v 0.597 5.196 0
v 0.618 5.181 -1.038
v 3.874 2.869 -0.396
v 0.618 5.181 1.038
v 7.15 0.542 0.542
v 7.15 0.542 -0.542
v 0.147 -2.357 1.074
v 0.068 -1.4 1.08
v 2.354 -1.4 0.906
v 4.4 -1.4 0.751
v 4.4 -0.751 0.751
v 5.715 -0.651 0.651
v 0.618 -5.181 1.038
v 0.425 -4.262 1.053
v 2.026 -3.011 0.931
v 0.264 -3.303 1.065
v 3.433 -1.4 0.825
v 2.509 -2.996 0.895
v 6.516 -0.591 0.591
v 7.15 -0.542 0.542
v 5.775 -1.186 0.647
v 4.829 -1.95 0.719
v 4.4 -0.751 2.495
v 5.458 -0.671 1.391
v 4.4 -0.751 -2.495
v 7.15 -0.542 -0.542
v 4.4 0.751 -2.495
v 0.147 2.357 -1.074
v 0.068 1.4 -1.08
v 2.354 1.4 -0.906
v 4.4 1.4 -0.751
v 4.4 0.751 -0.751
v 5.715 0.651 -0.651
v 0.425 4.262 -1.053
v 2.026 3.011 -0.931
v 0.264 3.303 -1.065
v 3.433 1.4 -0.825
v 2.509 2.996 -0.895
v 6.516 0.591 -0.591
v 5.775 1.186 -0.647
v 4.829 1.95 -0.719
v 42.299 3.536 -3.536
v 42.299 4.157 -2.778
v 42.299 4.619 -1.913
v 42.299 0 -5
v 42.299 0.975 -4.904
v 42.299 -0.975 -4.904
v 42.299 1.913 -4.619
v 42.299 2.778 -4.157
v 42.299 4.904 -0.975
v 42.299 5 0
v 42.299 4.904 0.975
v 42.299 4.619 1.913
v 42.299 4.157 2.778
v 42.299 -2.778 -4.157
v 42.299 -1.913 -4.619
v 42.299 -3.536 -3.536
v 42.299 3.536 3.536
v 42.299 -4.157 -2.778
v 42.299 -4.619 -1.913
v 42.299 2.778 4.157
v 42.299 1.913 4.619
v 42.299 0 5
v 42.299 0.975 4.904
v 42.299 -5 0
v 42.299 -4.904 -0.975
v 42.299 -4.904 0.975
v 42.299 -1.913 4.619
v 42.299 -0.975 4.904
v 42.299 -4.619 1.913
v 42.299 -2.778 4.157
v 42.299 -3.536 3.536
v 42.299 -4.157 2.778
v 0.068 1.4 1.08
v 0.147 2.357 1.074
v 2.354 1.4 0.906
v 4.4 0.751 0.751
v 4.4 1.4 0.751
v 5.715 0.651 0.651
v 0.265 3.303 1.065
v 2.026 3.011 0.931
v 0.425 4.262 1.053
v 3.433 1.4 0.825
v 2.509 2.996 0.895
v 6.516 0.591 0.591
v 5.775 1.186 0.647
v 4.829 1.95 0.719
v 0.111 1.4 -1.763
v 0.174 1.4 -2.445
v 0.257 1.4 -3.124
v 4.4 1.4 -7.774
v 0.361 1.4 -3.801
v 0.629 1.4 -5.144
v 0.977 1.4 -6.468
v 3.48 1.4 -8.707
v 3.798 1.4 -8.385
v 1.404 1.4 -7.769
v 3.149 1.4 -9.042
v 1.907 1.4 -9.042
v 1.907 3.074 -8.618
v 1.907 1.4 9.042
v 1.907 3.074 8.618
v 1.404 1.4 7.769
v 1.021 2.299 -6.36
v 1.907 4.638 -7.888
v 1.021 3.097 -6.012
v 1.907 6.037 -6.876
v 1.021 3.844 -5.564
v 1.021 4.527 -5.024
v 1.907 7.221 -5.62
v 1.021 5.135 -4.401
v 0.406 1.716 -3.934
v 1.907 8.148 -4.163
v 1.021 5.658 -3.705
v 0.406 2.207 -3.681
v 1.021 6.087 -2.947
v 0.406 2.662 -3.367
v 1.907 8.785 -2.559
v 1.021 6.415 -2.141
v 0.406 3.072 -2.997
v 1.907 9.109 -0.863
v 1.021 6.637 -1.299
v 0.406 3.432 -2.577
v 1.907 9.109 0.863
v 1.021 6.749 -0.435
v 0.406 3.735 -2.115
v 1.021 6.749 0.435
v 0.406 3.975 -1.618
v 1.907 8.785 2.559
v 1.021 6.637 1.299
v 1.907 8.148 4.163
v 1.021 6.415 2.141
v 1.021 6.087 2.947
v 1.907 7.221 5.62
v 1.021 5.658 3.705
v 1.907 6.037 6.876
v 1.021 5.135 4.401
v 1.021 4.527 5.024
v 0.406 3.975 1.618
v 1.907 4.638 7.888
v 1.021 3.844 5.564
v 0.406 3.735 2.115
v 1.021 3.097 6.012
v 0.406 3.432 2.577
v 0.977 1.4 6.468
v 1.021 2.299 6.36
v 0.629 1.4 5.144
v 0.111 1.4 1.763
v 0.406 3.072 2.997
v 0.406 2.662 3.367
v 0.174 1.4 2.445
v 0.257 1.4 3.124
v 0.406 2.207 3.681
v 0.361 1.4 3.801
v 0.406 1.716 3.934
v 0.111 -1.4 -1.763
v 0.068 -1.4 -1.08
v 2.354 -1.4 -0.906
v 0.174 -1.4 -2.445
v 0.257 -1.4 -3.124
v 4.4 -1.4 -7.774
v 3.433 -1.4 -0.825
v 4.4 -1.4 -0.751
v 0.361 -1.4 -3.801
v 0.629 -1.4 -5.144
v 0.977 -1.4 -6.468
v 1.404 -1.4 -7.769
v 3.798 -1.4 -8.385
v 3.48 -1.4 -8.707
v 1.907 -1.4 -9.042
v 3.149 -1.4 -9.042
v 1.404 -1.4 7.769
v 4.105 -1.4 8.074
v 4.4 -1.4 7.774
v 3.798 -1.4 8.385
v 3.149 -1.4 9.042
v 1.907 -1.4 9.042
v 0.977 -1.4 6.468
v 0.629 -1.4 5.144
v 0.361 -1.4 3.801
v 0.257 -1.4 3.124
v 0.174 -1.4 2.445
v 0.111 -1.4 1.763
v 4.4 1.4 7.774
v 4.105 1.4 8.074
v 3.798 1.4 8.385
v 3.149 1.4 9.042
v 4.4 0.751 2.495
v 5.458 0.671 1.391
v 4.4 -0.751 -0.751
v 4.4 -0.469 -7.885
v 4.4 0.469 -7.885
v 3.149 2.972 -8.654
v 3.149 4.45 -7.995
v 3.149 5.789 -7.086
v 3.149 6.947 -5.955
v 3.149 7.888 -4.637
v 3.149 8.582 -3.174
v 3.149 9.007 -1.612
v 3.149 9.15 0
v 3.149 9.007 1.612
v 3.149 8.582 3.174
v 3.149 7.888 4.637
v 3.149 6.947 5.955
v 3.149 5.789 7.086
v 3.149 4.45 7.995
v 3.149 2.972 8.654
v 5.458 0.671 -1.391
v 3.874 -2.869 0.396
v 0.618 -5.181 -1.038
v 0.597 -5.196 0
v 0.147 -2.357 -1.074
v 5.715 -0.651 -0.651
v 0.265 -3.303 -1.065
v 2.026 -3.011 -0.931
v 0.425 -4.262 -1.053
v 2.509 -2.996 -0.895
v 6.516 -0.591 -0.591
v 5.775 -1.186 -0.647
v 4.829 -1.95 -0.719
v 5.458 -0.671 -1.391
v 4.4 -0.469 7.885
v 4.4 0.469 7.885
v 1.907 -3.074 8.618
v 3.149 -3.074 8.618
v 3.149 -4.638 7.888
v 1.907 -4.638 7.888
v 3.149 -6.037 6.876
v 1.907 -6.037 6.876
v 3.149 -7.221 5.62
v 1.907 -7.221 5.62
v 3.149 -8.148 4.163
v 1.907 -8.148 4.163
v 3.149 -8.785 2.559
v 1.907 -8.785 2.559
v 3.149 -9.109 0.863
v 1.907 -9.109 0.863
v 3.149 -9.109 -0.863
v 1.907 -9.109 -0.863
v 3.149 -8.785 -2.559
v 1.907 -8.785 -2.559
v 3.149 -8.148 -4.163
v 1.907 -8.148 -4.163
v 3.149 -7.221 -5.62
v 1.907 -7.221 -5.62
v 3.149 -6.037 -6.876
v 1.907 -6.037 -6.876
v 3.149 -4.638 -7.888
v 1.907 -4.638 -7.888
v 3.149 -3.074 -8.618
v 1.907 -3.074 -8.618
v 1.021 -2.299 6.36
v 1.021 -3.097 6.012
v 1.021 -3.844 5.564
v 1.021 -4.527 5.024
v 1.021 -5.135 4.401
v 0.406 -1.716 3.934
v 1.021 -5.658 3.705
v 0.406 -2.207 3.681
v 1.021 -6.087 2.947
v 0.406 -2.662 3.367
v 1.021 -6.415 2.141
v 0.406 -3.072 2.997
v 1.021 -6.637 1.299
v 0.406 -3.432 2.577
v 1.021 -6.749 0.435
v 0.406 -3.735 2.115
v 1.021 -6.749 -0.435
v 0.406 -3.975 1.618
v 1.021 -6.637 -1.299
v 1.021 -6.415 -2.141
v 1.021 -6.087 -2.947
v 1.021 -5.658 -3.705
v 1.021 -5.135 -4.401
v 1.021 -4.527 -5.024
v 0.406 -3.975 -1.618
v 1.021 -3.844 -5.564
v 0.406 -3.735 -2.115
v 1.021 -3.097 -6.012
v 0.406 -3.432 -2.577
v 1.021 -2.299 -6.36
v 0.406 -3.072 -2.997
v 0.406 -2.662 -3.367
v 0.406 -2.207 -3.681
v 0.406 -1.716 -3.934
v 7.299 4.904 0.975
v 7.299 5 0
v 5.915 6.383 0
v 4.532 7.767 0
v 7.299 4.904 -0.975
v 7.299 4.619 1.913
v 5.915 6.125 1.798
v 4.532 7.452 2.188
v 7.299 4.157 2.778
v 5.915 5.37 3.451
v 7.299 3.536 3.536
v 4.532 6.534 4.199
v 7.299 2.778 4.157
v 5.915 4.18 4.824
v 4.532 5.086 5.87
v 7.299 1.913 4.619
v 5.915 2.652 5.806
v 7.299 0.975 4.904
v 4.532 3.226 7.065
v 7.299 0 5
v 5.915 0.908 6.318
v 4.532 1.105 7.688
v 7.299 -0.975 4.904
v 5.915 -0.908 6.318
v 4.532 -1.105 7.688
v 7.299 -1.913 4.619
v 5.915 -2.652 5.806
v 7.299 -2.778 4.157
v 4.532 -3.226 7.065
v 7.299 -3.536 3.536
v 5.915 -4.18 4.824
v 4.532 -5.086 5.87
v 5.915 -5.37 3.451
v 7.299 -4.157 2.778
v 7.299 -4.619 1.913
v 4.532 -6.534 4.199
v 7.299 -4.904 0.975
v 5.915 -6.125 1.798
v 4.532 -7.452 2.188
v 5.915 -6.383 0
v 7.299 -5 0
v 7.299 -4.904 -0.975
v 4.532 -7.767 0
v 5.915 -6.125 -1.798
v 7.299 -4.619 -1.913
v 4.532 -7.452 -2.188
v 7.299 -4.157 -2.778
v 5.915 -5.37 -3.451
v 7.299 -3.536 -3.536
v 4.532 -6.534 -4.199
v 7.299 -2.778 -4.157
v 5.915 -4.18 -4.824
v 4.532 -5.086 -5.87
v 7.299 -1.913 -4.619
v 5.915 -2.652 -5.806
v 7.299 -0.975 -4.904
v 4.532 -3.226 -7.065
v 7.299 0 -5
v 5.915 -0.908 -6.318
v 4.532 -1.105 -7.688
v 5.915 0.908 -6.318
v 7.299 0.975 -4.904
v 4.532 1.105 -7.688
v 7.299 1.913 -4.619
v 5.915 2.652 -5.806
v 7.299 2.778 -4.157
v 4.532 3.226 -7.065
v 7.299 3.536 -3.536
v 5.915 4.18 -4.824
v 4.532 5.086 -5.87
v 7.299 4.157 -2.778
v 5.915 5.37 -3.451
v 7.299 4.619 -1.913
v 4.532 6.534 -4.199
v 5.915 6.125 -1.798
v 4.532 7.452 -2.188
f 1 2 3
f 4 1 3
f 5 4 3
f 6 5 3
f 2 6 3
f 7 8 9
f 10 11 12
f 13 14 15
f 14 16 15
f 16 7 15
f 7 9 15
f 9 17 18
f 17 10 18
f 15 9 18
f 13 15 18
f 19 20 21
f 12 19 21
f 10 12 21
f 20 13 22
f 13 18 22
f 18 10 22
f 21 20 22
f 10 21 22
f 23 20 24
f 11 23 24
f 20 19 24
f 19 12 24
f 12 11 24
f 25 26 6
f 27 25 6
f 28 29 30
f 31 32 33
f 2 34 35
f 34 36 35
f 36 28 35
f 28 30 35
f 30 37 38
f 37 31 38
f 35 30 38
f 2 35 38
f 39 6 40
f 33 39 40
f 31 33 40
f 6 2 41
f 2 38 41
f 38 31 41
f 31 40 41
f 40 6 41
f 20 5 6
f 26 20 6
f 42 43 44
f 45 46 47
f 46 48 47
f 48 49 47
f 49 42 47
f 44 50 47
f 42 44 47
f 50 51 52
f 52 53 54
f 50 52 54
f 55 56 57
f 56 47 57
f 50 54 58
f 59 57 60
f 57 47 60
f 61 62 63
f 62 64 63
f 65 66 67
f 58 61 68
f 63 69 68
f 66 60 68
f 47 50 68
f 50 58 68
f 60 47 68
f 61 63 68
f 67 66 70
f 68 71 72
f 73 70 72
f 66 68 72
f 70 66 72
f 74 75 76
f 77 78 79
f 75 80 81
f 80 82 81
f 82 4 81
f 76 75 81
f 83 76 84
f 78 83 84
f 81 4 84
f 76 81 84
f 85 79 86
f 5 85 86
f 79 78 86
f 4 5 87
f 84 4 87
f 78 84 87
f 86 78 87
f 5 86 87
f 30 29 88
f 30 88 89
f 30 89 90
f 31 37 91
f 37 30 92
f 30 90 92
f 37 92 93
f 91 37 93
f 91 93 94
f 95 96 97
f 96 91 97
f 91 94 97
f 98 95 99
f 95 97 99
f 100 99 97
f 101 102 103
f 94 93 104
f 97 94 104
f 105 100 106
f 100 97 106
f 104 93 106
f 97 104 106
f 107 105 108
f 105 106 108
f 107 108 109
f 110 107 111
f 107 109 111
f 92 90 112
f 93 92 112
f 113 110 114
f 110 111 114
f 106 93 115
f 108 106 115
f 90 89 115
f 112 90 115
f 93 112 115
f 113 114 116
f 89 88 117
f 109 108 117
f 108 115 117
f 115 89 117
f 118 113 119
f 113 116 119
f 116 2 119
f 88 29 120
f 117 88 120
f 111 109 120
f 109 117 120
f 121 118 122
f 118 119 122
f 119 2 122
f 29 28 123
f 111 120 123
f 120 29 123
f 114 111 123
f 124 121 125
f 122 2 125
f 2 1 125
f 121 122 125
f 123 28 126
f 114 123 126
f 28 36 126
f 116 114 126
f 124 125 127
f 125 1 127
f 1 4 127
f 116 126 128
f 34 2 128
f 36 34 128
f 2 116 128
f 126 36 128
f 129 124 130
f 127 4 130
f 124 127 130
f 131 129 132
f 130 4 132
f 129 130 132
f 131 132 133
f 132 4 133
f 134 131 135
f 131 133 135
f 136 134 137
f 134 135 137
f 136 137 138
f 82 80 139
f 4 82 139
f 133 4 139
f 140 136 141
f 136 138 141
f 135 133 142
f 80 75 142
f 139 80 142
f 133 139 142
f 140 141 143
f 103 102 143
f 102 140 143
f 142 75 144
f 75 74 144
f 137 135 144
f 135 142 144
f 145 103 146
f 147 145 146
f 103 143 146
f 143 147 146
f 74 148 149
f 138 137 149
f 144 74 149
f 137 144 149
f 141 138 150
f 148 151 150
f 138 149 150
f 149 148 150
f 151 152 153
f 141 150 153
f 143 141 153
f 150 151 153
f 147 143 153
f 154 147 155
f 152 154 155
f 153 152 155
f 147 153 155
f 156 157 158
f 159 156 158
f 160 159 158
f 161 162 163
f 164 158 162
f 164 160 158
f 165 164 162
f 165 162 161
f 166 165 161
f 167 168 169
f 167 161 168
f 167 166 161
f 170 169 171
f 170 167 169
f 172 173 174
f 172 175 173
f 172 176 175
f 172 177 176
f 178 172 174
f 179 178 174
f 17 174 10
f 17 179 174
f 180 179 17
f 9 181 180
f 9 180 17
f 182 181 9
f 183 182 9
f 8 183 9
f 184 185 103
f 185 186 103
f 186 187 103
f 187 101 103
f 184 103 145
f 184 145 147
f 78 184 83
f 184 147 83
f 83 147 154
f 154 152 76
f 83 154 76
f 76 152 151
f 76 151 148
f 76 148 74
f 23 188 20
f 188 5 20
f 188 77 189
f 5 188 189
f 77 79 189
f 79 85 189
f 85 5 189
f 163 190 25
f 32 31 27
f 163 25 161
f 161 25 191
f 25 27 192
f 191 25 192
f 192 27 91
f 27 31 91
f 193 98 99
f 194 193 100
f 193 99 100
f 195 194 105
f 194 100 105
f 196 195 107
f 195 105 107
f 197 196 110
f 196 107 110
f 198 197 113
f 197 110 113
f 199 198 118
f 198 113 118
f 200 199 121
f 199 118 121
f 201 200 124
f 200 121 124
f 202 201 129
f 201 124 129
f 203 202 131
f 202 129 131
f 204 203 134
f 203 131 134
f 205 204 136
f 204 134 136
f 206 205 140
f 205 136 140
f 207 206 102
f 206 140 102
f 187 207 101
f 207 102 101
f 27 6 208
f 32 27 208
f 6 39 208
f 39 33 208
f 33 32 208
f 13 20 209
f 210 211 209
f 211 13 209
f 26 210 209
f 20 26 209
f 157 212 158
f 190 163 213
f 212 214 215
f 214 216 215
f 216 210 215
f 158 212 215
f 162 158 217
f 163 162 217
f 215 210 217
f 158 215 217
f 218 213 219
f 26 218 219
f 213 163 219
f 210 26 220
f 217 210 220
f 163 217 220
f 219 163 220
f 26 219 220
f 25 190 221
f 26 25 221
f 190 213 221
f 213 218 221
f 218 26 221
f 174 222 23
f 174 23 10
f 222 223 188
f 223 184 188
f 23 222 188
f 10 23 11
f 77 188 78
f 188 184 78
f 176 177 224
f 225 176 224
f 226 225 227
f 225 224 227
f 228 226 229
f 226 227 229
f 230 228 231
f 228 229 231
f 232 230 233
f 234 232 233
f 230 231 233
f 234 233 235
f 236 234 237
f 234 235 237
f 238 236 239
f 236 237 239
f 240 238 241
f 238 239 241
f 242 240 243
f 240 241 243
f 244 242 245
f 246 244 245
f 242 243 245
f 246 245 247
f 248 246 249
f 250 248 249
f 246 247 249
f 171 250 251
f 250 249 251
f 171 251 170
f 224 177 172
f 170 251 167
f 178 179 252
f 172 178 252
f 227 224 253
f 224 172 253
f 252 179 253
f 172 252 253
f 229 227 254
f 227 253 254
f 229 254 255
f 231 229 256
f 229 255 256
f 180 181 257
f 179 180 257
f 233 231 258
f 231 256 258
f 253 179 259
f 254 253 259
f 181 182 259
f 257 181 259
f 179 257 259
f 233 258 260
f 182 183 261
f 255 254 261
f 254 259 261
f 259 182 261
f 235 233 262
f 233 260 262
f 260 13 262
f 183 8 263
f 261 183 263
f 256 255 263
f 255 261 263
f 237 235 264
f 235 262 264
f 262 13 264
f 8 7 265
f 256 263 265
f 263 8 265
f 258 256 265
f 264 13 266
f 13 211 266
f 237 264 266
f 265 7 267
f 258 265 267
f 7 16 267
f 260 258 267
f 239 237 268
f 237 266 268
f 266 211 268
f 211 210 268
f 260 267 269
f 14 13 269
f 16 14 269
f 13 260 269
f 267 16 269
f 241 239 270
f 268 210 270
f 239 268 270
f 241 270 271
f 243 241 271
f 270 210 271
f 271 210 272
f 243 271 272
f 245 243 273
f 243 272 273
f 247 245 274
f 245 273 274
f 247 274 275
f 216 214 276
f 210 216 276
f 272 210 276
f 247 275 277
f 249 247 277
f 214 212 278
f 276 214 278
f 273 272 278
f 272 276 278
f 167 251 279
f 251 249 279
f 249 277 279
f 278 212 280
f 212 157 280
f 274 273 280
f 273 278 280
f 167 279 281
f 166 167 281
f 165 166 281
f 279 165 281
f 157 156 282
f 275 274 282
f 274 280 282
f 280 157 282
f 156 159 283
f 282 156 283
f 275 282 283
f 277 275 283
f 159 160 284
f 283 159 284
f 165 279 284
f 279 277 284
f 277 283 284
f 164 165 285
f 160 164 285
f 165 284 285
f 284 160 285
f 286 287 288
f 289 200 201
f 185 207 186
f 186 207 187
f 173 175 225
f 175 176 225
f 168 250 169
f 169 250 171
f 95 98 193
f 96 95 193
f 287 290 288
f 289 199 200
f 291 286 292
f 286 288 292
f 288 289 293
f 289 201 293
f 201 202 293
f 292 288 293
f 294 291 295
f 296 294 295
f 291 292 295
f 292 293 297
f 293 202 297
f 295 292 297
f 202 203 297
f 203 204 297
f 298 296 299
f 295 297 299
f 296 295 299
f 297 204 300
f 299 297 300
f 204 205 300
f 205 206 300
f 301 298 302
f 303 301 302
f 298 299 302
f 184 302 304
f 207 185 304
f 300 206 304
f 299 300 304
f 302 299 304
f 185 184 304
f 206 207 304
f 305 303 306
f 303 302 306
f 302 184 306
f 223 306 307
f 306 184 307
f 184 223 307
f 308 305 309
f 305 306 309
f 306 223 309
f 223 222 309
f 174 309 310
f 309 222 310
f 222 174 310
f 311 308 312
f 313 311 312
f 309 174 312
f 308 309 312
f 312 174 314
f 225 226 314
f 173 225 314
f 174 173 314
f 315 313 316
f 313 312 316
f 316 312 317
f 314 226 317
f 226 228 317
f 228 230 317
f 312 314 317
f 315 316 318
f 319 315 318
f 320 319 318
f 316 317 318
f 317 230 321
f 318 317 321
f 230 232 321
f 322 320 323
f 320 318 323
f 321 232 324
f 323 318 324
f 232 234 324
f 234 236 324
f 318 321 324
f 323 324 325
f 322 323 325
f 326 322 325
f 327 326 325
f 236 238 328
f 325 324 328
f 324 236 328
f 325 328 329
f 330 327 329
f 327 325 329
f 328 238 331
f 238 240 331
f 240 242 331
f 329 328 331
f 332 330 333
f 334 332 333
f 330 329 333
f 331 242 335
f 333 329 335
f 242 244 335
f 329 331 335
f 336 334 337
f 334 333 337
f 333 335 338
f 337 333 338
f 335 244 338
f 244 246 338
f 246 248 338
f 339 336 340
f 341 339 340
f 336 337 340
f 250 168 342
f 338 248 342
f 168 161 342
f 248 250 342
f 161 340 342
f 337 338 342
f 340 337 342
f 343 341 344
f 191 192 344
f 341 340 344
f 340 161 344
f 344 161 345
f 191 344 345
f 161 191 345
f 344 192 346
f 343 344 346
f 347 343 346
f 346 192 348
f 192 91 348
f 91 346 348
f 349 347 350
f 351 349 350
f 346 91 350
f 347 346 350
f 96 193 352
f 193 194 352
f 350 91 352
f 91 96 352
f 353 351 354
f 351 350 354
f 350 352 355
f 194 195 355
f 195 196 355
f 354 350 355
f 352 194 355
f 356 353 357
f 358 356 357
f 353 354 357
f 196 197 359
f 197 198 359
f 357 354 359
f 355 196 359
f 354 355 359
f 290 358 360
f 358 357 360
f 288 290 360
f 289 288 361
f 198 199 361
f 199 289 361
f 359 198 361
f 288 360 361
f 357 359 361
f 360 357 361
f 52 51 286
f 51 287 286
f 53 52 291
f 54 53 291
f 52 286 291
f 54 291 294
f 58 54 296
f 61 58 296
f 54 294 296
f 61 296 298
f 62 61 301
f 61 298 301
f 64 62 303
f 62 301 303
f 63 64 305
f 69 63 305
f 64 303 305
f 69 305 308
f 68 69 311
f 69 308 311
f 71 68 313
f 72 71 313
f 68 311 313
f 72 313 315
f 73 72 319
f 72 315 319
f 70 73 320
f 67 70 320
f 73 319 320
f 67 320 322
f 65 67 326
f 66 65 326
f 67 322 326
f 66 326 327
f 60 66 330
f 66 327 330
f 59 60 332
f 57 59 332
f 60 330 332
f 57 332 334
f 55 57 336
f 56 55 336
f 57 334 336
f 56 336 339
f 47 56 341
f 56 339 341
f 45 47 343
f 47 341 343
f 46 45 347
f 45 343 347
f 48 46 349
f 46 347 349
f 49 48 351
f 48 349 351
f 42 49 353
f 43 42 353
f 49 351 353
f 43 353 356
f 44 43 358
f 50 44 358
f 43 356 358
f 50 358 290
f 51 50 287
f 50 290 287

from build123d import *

# Parameters (mm, degrees)
SKETCH2_W         = 18.3
SKETCH2_H         = 2.8
SLOT_DEPTH        = 4.4
SKETCH3_W         = 2.17
SKETCH3_H         = 11.24
SKETCH4_W         = 1.085
SKETCH4_H         = 1.085
CIRPATTERN1_COUNT = 2
CIRPATTERN1_ANGLE = 90


with BuildPart() as part:
    # BodySke → Base-Revolve (revolve)
    with BuildSketch(Plane.XY):
        with BuildLine():
            Line((0, 0), (42.298786444, 0))
            Line((42.298786444, 0), (42.298786444, 5))
            Line((42.298786444, 5), (7.298786444, 5))
            Line((7.298786444, 5), (3.148786444, 9.15))
            Line((3.148786444, 9.15), (1.907441795, 9.15))
            ThreePointArc((1.907441795, 9.15), (0.481931585, 4.673350891), (0, 0))
        make_face()
    revolve(axis=Axis((-15.875, 0, 0), (1, 0, 0)))

    # Sketch2 → Slot (cut)
    with BuildSketch(Plane(origin=(0, 0, 0), x_dir=(0, 0, -1), z_dir=(1, 0, 0))):
        Rectangle(SKETCH2_W, SKETCH2_H)
    extrude(amount=SLOT_DEPTH, mode=Mode.SUBTRACT)

    # Sketch3 → Cross section 0
    with BuildSketch(Plane(origin=(0, 0, 0), x_dir=(0, 0, -1), z_dir=(1, 0, 0))):
        Rectangle(SKETCH3_W, SKETCH3_H)
    # Sketch4 → Cross section 1
    with BuildSketch(Plane(origin=(7.15, 0, 0), x_dir=(0, 0, -1), z_dir=(1, 0, 0))):
        Rectangle(SKETCH4_W, SKETCH4_H)
    cross = loft(mode=Mode.SUBTRACT)

    # CirPattern1: Cross ×2 about axis
    cirpattern1_axis = Axis((0, 0, 0), (1, 0, 0))
    for i in range(1, CIRPATTERN1_COUNT):
        add(cross.rotate(cirpattern1_axis, i * CIRPATTERN1_ANGLE / (CIRPATTERN1_COUNT - 1)), mode=Mode.SUBTRACT)


solid = part.part
